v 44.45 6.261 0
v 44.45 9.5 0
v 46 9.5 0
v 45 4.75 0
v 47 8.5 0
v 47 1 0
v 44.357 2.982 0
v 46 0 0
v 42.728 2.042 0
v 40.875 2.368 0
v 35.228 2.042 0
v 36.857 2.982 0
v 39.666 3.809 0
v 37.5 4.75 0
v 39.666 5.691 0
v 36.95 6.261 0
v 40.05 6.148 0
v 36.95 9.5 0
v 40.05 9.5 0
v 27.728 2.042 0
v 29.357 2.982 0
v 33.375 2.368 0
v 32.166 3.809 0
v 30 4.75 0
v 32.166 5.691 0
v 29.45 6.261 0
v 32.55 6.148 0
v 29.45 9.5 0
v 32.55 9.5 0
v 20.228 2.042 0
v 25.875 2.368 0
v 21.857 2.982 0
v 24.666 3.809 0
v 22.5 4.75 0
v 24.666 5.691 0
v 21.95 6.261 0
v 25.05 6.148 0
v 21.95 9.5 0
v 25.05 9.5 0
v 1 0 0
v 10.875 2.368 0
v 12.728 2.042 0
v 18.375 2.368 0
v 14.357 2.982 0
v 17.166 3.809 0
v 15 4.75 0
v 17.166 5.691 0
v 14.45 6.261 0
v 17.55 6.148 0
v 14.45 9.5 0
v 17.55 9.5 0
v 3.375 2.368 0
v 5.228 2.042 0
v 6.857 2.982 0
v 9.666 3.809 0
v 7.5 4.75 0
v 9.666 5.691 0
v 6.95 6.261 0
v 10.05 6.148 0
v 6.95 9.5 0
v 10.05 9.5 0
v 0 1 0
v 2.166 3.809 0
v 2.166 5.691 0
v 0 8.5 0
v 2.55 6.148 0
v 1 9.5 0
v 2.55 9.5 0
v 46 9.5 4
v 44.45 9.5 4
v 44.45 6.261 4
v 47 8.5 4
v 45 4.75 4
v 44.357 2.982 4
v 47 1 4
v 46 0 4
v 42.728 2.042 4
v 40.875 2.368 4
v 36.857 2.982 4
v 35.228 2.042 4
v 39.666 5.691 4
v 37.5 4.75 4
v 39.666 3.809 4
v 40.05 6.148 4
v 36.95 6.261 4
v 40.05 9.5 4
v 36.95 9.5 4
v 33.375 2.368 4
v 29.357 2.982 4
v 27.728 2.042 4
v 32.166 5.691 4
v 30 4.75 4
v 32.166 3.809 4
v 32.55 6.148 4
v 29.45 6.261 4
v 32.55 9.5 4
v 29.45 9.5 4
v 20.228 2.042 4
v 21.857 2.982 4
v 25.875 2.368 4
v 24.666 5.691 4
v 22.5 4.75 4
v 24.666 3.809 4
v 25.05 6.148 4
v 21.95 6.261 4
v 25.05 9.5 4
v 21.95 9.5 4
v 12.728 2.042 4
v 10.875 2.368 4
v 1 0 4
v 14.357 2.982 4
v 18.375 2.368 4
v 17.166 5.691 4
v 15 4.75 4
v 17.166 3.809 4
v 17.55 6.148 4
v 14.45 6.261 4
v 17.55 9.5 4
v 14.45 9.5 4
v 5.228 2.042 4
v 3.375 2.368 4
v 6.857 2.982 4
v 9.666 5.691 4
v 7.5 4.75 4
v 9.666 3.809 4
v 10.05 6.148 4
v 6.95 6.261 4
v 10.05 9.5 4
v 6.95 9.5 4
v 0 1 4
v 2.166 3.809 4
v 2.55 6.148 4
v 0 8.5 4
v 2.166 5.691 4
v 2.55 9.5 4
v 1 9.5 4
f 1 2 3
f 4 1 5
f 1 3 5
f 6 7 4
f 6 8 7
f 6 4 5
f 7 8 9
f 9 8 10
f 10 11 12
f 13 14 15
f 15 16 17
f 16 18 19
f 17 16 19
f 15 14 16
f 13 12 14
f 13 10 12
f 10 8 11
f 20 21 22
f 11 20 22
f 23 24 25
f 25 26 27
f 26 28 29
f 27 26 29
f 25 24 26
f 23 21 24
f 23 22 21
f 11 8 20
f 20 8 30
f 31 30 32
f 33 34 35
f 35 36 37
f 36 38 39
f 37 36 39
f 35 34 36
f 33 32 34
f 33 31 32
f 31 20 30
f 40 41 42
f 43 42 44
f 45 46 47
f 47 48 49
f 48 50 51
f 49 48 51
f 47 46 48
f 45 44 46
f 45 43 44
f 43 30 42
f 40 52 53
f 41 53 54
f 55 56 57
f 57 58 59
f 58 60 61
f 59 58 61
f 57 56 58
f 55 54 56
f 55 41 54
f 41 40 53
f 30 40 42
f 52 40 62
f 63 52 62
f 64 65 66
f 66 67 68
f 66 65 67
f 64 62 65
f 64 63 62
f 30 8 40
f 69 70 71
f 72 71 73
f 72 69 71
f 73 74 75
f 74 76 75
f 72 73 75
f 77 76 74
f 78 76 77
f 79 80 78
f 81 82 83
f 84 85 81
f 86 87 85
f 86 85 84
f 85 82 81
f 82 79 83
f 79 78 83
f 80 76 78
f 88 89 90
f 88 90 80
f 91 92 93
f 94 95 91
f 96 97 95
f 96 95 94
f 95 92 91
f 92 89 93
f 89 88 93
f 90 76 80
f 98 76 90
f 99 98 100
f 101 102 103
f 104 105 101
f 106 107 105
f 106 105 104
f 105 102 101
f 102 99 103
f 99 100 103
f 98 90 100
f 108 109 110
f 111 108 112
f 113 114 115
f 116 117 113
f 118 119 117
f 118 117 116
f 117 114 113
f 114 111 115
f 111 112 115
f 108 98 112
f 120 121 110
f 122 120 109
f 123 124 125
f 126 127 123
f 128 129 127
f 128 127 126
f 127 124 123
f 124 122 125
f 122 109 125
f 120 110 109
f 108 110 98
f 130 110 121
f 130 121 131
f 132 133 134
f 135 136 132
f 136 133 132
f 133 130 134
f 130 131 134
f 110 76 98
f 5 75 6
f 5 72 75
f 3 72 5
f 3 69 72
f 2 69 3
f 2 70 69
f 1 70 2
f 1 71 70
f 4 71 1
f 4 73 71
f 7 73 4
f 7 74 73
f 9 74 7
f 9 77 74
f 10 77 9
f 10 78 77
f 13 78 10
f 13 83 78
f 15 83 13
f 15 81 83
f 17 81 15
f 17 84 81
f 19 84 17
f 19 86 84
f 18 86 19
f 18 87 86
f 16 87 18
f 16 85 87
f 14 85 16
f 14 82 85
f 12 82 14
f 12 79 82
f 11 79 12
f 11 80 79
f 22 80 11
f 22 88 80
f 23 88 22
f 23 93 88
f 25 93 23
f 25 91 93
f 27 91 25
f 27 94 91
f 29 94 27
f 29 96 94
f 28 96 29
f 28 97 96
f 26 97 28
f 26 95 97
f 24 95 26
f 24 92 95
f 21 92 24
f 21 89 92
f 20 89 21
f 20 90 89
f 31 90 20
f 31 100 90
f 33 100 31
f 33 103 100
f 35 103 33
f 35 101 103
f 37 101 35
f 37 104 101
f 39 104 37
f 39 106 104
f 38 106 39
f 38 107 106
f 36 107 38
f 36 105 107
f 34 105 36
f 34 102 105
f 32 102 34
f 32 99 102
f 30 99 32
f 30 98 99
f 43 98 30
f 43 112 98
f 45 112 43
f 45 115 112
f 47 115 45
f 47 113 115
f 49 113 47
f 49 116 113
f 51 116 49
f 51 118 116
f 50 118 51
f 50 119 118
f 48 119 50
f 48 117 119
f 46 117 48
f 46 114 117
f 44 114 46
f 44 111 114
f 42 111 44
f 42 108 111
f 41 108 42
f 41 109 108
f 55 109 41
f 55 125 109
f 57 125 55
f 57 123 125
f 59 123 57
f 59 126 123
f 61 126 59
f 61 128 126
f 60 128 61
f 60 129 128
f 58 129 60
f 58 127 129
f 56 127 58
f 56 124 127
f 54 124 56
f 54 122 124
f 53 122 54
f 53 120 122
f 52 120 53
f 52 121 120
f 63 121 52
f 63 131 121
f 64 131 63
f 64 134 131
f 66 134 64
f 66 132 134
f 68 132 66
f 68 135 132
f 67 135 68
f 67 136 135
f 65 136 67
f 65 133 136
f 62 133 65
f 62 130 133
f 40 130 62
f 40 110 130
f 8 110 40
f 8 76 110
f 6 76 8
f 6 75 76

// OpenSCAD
// Cable comb: keeps a bundle of wires parallel
cables = 6;          // [2:20]
cable_d = 5.5;       // [2:0.1:12]
spacing = 2;         // [1:0.5:6]
thickness = 4;       // [2:10]
slot = 0.8;          // fraction of cable_d left open [0.5:0.05:1]

pitch = cable_d + spacing;
width = cables * pitch + spacing;
height = cable_d + 2 * spacing;

linear_extrude(height = thickness)
  difference() {
    offset(r = 1) offset(delta = -1) square([width, height]);
    for (i = [0 : cables - 1]) {
      x = spacing + cable_d / 2 + i * pitch;
      translate([x, height / 2]) circle(d = cable_d);
      translate([x - cable_d * slot / 2, height / 2]) square([cable_d * slot, height]);
    }
  }
